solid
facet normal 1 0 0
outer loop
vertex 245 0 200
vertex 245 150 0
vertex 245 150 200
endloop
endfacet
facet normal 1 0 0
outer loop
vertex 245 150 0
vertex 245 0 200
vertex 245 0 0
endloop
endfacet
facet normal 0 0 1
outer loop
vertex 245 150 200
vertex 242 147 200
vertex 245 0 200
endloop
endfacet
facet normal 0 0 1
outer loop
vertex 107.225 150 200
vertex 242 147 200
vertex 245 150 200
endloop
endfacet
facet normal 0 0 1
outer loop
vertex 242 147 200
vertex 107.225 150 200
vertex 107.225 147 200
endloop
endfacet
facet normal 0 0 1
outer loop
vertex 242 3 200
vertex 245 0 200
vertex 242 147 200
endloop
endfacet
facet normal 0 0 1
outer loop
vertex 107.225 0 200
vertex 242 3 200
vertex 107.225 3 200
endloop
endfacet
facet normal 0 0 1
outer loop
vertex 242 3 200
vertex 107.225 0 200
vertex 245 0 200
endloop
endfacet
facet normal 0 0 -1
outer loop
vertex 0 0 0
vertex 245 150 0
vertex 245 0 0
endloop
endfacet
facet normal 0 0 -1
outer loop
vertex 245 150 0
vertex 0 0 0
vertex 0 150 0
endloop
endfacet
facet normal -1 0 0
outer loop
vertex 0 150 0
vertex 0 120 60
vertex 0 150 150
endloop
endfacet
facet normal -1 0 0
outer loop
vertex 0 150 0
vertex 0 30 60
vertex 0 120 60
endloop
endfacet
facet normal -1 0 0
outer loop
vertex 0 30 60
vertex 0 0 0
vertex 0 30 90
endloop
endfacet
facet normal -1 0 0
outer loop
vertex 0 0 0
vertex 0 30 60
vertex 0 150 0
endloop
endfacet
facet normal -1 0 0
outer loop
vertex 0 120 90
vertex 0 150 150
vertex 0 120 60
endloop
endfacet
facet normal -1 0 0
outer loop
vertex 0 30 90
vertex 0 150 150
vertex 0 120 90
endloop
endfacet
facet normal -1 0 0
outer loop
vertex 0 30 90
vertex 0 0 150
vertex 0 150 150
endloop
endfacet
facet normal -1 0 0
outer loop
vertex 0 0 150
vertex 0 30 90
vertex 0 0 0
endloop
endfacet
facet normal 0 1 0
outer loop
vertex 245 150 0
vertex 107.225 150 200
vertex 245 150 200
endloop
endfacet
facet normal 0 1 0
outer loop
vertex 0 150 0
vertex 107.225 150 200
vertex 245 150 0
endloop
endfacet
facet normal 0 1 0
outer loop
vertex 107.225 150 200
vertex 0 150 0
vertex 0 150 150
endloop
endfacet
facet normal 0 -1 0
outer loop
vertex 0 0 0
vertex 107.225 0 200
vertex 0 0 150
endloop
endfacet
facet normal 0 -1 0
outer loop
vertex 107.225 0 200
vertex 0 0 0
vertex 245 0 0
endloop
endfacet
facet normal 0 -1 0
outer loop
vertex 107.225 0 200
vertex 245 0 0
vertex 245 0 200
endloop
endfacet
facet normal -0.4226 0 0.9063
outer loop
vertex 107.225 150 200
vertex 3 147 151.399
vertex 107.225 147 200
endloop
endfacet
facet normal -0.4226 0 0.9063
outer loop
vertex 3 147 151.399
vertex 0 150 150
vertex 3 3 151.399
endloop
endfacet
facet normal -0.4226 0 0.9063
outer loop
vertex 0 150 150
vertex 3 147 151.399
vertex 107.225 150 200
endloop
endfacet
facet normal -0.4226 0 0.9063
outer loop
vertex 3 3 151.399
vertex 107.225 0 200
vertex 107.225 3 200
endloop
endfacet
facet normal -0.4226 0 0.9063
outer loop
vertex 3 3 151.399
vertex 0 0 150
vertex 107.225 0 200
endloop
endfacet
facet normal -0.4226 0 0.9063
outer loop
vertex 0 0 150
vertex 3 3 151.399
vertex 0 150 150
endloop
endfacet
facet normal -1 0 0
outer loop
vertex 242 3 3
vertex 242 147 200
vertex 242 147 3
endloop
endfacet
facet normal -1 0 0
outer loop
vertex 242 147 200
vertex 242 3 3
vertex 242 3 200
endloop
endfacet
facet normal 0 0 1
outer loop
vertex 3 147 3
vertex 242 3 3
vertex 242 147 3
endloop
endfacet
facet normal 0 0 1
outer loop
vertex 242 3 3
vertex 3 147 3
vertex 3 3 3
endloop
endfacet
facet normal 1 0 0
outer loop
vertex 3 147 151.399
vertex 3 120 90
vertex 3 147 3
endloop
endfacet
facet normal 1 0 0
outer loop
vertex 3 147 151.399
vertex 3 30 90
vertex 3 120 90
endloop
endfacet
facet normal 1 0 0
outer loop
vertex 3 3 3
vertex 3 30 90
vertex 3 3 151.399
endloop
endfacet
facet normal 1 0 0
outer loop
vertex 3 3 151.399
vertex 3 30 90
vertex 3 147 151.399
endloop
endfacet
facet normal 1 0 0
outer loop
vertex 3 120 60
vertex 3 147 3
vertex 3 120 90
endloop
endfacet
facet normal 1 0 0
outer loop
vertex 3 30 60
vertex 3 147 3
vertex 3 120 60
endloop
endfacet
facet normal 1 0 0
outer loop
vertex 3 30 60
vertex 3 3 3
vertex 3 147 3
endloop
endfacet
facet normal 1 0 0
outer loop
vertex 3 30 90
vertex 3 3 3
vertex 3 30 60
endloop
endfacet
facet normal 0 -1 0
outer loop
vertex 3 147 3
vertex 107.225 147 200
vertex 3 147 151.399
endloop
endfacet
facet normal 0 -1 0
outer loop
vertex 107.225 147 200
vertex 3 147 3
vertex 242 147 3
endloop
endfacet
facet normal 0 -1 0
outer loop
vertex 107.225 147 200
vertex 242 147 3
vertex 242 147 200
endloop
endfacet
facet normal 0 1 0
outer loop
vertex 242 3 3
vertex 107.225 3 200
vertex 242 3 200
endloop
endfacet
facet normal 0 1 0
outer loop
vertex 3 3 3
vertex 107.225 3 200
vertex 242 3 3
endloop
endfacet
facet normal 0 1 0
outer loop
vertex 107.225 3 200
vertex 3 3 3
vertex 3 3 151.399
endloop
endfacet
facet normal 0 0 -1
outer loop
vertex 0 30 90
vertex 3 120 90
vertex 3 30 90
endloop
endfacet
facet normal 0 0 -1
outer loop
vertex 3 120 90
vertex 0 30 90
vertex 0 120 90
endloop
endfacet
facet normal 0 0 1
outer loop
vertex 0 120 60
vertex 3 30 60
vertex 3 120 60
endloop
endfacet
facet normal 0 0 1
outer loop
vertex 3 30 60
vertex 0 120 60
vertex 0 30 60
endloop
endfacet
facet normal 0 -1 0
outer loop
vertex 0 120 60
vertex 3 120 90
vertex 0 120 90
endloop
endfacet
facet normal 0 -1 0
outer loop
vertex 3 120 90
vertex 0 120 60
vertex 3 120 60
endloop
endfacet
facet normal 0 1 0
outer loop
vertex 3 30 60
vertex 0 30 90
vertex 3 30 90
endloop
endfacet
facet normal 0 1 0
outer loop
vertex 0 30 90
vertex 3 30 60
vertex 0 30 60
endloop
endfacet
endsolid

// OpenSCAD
width = 245;
height1 = 150;
height2 = 200;
depth = 150;
wall = 3;
angle = 25;

handle = [90,30];

difference() {
    cube([width,depth,height2]);
    translate([0,-1,height1]) rotate([0,-angle,0]) cube([width/cos(angle),depth+2,height2]);
    translate([wall,wall,wall]) cube([width-2*wall,depth-2*wall,height2]);
    translate([-1,(depth-handle[0])/2,(height1-handle[1])/2]) cube([wall+2,handle[0],handle[1]]);
}
